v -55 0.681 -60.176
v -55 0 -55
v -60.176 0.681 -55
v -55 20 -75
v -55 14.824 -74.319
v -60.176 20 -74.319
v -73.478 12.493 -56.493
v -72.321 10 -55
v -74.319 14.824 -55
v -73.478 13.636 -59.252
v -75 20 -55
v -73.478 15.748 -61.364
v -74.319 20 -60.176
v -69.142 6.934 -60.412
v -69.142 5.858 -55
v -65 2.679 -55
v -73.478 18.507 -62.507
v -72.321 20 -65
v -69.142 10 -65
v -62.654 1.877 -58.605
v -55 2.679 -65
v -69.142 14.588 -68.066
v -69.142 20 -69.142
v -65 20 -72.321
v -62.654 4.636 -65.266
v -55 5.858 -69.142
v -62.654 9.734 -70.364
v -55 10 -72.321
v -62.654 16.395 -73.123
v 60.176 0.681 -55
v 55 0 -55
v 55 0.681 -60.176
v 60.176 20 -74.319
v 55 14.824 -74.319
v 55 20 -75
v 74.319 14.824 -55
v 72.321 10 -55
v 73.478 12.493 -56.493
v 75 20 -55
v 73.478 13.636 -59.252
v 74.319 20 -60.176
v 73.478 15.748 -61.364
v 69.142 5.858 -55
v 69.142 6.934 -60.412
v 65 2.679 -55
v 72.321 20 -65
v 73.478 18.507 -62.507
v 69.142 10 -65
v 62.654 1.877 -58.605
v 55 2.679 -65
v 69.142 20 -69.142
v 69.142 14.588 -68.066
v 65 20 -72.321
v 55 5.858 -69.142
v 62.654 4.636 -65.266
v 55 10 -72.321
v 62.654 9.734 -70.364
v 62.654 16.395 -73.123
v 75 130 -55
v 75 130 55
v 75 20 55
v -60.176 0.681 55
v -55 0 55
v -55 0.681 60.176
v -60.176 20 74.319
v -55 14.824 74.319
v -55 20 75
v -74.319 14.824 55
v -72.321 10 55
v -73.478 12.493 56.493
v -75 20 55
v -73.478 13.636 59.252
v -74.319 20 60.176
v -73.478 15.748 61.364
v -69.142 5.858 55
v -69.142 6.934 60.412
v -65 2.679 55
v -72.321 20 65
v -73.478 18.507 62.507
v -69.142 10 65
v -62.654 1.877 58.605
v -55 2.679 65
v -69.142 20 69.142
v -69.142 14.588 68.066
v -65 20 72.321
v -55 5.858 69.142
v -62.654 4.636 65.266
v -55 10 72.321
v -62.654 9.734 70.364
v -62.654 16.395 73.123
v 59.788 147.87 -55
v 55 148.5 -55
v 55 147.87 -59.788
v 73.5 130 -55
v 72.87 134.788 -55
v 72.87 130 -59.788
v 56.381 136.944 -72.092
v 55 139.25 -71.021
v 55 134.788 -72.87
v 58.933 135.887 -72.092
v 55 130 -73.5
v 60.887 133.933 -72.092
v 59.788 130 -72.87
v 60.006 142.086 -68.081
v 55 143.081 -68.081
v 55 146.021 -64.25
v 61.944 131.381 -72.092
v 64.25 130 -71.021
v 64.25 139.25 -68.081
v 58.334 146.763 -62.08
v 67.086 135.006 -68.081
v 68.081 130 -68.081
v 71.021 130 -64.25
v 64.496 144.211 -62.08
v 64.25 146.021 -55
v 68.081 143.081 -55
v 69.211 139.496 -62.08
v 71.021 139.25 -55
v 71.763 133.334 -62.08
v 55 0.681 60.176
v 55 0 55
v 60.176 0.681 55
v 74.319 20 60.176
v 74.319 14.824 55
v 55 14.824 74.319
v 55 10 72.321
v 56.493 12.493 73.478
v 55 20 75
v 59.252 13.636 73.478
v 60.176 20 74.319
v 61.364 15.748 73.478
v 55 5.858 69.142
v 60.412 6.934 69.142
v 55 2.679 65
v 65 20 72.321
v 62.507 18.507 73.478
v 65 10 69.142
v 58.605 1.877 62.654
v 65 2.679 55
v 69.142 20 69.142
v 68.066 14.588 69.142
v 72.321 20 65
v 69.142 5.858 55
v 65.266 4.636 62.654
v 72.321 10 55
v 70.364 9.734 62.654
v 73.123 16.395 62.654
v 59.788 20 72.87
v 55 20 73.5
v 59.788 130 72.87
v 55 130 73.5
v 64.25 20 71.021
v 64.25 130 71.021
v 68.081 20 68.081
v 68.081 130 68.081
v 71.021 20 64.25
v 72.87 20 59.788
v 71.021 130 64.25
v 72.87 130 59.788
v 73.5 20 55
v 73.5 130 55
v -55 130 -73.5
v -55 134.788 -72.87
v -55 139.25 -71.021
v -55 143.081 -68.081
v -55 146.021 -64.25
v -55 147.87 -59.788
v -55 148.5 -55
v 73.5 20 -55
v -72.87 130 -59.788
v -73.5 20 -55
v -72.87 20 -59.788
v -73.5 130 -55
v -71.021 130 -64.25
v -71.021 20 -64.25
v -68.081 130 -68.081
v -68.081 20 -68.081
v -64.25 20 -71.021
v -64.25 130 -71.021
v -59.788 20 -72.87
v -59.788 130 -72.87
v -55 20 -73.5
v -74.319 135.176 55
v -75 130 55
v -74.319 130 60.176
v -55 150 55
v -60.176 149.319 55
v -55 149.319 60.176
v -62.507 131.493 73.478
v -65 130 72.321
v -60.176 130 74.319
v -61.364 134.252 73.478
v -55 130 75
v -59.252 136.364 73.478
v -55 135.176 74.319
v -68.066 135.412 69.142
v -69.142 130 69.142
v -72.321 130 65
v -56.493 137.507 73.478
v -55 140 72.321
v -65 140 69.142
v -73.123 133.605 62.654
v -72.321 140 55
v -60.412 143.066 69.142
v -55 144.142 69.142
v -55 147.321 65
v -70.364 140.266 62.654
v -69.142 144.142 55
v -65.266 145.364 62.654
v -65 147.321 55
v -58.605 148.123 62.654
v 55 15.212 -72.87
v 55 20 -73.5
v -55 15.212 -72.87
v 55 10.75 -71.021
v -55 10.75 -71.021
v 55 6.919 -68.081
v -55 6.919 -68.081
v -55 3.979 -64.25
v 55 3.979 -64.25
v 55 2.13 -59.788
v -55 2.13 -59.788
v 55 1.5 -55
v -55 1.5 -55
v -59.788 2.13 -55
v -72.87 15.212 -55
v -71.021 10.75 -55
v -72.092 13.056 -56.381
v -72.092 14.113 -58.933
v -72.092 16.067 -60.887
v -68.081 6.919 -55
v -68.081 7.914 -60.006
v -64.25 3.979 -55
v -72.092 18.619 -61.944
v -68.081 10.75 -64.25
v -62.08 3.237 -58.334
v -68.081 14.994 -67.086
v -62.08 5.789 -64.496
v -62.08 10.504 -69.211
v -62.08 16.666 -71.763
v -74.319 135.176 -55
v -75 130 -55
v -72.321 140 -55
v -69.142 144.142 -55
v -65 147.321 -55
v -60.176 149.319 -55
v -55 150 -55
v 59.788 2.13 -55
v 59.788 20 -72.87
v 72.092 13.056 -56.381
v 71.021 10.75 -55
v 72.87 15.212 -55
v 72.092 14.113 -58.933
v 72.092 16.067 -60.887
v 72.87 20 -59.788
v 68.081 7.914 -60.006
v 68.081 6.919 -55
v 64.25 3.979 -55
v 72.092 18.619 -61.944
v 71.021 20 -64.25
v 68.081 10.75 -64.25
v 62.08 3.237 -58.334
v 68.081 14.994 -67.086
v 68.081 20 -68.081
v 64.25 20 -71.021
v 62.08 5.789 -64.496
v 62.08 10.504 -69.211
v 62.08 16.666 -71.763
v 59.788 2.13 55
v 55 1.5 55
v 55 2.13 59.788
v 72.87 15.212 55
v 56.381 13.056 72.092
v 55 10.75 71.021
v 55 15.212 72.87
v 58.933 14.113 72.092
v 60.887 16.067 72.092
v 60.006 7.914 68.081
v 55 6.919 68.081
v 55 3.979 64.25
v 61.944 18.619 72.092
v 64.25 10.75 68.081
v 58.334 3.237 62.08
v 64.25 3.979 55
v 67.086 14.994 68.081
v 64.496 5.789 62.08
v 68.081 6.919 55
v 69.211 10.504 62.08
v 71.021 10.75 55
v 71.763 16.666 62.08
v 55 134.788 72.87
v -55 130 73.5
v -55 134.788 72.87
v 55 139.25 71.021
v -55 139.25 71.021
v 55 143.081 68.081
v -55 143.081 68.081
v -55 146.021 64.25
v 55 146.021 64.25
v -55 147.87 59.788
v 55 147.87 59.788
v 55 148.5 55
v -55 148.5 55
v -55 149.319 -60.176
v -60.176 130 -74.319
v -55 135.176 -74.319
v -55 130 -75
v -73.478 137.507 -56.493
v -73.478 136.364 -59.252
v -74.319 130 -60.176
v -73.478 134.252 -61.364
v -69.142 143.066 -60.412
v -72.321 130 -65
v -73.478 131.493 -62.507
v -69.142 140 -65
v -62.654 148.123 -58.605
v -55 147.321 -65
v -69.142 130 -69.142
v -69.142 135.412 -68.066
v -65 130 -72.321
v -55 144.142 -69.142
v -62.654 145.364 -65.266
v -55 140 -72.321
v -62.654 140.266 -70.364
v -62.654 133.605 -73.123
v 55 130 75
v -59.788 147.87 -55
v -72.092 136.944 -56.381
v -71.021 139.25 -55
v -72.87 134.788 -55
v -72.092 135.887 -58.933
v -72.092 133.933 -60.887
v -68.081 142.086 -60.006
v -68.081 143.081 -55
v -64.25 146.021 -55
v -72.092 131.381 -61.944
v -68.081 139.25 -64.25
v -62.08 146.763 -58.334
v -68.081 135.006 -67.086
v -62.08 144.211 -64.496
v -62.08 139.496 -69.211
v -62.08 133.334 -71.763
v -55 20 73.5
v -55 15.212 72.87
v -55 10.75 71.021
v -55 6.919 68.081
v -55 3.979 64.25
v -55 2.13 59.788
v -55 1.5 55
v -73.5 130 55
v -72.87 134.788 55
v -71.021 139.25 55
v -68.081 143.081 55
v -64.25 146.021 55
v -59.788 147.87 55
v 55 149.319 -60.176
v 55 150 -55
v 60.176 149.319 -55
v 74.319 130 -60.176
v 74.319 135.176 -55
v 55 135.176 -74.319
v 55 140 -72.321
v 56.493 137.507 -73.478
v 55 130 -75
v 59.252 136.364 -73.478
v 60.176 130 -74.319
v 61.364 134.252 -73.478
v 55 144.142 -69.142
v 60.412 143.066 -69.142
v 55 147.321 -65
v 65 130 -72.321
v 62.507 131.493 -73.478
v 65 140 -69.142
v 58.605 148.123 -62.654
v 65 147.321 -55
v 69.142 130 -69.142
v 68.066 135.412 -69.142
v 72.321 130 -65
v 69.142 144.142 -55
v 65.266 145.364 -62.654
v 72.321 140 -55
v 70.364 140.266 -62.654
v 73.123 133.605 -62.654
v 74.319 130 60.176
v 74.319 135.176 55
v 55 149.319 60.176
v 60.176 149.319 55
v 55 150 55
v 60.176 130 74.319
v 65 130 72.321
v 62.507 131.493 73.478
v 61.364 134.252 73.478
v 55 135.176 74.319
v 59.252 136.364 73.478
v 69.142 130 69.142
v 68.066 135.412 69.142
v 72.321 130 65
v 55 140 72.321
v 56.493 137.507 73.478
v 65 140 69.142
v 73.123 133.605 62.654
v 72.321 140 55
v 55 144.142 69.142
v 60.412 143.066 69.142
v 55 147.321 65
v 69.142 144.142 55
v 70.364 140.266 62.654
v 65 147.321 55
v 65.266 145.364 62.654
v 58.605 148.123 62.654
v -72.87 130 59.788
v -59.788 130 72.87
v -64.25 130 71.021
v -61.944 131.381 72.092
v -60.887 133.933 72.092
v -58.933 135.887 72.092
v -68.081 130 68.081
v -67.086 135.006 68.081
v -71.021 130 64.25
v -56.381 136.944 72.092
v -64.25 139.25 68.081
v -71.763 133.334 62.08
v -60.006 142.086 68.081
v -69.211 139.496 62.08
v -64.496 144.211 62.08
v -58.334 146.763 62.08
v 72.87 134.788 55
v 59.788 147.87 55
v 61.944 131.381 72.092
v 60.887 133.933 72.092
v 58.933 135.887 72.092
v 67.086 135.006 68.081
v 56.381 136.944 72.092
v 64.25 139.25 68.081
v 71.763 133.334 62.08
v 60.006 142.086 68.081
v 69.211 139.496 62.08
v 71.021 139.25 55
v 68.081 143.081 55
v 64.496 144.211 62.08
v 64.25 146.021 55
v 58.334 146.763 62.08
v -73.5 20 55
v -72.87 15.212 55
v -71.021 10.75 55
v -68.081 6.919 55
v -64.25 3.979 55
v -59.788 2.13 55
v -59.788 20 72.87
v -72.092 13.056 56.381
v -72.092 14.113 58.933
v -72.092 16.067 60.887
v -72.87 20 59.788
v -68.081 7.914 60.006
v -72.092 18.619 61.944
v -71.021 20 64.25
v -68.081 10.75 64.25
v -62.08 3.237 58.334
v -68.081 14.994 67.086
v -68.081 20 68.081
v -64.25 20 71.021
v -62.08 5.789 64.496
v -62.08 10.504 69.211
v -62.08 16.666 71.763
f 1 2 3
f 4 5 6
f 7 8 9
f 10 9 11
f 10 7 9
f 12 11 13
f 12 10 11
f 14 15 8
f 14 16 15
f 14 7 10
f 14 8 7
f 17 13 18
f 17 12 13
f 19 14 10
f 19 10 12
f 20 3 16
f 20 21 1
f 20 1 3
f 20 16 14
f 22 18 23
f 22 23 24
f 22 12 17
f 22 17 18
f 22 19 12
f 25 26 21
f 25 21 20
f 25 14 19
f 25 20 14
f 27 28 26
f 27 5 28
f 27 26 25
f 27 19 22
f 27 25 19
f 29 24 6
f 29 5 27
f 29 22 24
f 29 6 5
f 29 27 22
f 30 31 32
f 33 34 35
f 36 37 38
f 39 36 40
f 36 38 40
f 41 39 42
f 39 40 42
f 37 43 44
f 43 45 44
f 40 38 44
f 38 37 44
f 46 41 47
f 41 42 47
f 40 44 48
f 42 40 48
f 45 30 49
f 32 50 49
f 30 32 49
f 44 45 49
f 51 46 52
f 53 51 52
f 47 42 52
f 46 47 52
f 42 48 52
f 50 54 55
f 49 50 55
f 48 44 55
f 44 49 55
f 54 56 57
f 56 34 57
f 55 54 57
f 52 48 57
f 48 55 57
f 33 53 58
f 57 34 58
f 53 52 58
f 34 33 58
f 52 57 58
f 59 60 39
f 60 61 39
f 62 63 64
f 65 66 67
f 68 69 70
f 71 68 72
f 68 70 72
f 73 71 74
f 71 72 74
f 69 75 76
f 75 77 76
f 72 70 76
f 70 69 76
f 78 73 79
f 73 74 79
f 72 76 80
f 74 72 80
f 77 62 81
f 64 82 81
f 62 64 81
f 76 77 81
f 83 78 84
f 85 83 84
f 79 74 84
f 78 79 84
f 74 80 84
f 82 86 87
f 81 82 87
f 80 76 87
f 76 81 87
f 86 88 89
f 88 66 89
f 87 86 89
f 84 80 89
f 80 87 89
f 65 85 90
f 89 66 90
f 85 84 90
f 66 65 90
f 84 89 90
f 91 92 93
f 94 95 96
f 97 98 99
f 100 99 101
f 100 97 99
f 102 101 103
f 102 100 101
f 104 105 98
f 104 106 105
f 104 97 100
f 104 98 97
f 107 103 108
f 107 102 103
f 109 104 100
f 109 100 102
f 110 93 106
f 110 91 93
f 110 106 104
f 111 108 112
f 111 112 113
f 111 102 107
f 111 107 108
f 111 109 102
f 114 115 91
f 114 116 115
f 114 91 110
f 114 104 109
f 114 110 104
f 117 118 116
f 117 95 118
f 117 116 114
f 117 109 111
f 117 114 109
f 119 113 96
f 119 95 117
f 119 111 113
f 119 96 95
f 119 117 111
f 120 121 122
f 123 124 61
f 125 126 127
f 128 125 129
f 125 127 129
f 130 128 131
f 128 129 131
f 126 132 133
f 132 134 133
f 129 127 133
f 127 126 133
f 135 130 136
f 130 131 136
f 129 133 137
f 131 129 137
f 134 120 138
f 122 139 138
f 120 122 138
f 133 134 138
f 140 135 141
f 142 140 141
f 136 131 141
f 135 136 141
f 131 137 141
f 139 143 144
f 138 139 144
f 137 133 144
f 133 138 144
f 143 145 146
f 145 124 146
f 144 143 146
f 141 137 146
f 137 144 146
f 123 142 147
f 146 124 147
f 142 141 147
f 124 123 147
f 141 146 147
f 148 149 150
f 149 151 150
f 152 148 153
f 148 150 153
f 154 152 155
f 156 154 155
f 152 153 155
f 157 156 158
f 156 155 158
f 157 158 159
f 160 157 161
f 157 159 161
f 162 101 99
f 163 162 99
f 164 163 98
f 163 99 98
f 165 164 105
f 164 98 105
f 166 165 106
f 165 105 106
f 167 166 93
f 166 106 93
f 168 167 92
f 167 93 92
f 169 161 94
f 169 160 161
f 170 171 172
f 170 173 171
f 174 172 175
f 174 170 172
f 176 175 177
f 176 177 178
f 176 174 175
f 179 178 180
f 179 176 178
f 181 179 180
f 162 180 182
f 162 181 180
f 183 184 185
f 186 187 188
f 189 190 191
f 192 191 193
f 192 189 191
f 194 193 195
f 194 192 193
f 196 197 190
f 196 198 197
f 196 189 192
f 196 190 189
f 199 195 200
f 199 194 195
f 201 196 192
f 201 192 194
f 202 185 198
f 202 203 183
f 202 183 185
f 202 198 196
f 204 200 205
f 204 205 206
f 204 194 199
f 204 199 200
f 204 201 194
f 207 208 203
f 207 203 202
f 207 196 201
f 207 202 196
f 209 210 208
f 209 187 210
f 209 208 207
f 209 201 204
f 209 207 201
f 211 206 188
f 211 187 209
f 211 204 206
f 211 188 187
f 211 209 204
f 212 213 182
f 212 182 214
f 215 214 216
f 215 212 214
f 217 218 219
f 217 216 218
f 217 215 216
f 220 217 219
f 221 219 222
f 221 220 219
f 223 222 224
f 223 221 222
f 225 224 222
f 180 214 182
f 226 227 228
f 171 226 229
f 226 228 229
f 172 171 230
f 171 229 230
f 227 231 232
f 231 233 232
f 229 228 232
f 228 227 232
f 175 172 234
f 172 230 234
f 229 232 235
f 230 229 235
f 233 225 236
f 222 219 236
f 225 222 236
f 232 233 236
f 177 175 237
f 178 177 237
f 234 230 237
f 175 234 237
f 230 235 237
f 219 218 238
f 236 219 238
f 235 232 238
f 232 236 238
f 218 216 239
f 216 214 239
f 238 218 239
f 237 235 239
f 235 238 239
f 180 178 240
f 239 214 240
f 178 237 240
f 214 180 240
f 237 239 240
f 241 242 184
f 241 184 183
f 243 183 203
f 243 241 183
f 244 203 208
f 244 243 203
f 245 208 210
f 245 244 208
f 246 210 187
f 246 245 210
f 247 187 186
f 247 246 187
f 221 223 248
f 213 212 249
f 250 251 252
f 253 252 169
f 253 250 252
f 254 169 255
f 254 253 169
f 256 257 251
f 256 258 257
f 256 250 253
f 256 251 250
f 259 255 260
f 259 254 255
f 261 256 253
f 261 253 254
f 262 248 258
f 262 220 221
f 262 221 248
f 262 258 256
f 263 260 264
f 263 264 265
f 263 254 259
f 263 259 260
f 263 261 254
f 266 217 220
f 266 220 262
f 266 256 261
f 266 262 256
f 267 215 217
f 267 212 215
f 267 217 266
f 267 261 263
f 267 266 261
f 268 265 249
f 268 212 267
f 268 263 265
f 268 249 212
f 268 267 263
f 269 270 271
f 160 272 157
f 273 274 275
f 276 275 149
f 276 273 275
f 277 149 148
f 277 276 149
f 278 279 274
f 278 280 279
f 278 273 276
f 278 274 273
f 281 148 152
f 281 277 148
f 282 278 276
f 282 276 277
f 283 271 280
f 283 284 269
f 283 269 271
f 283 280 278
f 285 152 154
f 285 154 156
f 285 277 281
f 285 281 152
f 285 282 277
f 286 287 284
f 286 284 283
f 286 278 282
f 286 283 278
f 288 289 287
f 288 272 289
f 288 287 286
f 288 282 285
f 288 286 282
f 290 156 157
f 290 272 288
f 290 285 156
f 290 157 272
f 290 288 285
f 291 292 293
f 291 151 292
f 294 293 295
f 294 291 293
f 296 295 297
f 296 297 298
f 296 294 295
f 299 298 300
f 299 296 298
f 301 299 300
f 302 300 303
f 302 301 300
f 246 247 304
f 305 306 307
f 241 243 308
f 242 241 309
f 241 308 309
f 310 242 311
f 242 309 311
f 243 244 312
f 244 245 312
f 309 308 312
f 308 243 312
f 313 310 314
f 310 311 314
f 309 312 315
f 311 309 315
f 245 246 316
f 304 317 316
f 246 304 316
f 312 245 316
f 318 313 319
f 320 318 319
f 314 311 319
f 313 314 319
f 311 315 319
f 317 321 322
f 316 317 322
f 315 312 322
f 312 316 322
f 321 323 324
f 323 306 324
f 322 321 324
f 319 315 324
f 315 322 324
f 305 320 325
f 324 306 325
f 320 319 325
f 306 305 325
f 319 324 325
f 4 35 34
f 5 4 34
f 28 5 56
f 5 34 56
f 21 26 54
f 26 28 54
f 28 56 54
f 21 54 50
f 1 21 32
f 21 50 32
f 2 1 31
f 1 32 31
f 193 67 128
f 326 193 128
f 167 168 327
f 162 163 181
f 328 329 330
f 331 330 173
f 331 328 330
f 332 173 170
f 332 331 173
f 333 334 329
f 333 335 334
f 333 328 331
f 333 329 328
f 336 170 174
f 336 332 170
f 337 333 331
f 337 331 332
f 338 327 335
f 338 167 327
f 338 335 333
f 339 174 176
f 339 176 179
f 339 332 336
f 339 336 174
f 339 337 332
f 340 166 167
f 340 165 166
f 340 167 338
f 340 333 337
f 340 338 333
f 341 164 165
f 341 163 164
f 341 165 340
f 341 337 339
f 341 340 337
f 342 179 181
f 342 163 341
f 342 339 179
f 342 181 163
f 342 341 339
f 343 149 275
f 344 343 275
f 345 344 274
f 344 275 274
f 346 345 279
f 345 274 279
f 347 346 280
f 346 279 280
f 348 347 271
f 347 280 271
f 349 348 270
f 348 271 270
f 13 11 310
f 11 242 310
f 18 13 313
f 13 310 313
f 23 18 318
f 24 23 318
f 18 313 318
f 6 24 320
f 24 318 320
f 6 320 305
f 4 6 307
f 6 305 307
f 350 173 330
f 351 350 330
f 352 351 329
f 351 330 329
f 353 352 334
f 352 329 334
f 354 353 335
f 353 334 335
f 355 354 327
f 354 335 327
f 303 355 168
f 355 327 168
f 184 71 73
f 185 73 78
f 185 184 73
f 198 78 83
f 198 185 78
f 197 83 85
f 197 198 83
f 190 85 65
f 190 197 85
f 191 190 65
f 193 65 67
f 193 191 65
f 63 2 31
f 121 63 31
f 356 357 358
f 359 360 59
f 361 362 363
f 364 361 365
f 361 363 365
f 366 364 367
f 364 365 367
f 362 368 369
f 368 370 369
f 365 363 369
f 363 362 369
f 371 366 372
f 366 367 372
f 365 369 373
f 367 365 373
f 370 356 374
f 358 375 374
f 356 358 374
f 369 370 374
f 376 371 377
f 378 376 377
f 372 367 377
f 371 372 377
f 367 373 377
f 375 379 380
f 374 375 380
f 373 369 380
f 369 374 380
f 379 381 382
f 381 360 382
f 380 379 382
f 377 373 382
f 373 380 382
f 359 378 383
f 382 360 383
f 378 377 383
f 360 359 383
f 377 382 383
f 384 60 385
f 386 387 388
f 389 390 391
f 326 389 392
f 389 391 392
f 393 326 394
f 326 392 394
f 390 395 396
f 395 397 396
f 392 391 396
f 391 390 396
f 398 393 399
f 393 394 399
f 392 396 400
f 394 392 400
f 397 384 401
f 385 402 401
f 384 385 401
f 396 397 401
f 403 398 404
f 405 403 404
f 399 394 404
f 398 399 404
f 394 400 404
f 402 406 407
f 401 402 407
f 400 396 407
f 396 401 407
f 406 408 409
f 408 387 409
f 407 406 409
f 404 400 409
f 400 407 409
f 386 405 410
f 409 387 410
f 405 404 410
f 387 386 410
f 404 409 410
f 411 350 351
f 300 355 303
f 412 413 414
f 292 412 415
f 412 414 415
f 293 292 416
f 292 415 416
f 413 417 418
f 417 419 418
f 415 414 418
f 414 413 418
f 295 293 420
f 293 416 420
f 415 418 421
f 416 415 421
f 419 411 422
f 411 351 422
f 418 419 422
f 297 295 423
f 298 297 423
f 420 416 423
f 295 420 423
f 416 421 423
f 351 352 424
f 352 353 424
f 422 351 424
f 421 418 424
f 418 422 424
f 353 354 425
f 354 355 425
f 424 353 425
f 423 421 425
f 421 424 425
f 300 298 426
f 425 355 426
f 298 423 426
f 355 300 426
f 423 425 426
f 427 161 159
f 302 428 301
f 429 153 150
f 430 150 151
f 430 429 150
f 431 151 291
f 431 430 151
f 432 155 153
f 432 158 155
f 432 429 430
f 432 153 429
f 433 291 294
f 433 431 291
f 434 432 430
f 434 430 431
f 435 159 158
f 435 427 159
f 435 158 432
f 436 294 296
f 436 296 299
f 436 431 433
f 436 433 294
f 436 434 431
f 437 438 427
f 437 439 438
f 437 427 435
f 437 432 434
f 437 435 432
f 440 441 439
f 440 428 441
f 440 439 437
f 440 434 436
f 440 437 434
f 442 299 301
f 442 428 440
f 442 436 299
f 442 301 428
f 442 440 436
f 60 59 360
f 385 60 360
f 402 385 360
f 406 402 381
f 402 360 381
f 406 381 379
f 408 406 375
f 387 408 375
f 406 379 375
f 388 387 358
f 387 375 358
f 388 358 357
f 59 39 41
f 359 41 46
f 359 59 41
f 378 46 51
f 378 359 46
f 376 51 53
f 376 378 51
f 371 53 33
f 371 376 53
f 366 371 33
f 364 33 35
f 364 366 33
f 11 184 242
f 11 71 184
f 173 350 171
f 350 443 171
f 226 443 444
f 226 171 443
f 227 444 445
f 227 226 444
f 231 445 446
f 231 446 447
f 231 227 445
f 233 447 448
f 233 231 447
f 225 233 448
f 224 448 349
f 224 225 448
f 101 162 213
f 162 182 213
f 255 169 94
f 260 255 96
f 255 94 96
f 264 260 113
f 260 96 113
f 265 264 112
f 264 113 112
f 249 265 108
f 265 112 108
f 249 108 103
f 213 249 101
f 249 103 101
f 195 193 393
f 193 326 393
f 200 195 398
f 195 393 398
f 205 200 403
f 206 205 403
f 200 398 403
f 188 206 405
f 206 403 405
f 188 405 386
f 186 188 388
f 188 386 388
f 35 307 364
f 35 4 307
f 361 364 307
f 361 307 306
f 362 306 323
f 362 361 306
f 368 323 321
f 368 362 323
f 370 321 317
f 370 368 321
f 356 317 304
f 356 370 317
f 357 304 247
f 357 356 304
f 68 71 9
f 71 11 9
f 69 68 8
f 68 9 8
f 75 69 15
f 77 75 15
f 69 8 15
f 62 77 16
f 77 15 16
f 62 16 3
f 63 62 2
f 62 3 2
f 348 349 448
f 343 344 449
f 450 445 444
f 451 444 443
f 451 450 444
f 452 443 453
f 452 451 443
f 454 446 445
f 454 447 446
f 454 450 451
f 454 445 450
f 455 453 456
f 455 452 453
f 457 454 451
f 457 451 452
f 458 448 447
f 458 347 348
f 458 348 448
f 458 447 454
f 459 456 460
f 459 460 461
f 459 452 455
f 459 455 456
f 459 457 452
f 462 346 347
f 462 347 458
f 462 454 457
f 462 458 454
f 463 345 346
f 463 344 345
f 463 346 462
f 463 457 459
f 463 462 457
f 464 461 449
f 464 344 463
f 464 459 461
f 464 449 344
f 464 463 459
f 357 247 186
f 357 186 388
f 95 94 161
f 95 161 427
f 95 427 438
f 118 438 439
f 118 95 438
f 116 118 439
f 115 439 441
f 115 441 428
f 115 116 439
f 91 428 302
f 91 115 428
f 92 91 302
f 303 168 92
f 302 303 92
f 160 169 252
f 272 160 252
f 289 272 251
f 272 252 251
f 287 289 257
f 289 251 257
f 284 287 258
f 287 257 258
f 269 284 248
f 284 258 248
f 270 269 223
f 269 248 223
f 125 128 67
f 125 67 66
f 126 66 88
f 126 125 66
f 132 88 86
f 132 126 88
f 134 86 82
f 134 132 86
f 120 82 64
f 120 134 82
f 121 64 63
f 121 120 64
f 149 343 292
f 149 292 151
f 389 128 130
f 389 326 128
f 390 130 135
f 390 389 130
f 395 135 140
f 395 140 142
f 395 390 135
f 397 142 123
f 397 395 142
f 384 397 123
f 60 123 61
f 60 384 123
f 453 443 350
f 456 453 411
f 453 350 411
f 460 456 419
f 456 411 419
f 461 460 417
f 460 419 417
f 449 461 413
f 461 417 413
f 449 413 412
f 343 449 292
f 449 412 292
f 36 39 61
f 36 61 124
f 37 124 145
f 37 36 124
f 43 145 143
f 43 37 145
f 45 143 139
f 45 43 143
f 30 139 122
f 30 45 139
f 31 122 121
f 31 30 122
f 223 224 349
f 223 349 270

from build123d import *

# Parameters (mm, degrees)
SKETCH1_W           = 150
SKETCH1_H           = 150
BOSS_EXTRUDE1_DEPTH = 150
FILLET1_R           = 20
SHELL1_T            = 1.5


with BuildPart() as part:
    # Sketch1 → Boss-Extrude1 (new body)
    with BuildSketch(Plane(origin=(0, 0, 0), x_dir=(1, 0, 0), z_dir=(0, 1, 0))):
        Rectangle(SKETCH1_W, SKETCH1_H)
    extrude(amount=BOSS_EXTRUDE1_DEPTH)

    # Fillet1
    fillet1_edges = [part.edges().sort_by_distance(p)[0] for p in [
        (75, 150, 0),
        (0, 150, -75),
        (-75, 150, 0),
        (0, 0, -75),
        (75, 0, 0),
        (0, 0, 75),
        (-75, 0, 0),
        (-75, 75, -75),
        (75, 75, -75),
        (75, 75, 75),
        (-75, 75, 75),
        (0, 150, 75),
    ]]
    fillet(fillet1_edges, radius=FILLET1_R)

    # Shell1 (no face opened: a closed hollow body)
    add(offset(amount=-SHELL1_T, mode=Mode.PRIVATE), mode=Mode.SUBTRACT)


solid = part.part
